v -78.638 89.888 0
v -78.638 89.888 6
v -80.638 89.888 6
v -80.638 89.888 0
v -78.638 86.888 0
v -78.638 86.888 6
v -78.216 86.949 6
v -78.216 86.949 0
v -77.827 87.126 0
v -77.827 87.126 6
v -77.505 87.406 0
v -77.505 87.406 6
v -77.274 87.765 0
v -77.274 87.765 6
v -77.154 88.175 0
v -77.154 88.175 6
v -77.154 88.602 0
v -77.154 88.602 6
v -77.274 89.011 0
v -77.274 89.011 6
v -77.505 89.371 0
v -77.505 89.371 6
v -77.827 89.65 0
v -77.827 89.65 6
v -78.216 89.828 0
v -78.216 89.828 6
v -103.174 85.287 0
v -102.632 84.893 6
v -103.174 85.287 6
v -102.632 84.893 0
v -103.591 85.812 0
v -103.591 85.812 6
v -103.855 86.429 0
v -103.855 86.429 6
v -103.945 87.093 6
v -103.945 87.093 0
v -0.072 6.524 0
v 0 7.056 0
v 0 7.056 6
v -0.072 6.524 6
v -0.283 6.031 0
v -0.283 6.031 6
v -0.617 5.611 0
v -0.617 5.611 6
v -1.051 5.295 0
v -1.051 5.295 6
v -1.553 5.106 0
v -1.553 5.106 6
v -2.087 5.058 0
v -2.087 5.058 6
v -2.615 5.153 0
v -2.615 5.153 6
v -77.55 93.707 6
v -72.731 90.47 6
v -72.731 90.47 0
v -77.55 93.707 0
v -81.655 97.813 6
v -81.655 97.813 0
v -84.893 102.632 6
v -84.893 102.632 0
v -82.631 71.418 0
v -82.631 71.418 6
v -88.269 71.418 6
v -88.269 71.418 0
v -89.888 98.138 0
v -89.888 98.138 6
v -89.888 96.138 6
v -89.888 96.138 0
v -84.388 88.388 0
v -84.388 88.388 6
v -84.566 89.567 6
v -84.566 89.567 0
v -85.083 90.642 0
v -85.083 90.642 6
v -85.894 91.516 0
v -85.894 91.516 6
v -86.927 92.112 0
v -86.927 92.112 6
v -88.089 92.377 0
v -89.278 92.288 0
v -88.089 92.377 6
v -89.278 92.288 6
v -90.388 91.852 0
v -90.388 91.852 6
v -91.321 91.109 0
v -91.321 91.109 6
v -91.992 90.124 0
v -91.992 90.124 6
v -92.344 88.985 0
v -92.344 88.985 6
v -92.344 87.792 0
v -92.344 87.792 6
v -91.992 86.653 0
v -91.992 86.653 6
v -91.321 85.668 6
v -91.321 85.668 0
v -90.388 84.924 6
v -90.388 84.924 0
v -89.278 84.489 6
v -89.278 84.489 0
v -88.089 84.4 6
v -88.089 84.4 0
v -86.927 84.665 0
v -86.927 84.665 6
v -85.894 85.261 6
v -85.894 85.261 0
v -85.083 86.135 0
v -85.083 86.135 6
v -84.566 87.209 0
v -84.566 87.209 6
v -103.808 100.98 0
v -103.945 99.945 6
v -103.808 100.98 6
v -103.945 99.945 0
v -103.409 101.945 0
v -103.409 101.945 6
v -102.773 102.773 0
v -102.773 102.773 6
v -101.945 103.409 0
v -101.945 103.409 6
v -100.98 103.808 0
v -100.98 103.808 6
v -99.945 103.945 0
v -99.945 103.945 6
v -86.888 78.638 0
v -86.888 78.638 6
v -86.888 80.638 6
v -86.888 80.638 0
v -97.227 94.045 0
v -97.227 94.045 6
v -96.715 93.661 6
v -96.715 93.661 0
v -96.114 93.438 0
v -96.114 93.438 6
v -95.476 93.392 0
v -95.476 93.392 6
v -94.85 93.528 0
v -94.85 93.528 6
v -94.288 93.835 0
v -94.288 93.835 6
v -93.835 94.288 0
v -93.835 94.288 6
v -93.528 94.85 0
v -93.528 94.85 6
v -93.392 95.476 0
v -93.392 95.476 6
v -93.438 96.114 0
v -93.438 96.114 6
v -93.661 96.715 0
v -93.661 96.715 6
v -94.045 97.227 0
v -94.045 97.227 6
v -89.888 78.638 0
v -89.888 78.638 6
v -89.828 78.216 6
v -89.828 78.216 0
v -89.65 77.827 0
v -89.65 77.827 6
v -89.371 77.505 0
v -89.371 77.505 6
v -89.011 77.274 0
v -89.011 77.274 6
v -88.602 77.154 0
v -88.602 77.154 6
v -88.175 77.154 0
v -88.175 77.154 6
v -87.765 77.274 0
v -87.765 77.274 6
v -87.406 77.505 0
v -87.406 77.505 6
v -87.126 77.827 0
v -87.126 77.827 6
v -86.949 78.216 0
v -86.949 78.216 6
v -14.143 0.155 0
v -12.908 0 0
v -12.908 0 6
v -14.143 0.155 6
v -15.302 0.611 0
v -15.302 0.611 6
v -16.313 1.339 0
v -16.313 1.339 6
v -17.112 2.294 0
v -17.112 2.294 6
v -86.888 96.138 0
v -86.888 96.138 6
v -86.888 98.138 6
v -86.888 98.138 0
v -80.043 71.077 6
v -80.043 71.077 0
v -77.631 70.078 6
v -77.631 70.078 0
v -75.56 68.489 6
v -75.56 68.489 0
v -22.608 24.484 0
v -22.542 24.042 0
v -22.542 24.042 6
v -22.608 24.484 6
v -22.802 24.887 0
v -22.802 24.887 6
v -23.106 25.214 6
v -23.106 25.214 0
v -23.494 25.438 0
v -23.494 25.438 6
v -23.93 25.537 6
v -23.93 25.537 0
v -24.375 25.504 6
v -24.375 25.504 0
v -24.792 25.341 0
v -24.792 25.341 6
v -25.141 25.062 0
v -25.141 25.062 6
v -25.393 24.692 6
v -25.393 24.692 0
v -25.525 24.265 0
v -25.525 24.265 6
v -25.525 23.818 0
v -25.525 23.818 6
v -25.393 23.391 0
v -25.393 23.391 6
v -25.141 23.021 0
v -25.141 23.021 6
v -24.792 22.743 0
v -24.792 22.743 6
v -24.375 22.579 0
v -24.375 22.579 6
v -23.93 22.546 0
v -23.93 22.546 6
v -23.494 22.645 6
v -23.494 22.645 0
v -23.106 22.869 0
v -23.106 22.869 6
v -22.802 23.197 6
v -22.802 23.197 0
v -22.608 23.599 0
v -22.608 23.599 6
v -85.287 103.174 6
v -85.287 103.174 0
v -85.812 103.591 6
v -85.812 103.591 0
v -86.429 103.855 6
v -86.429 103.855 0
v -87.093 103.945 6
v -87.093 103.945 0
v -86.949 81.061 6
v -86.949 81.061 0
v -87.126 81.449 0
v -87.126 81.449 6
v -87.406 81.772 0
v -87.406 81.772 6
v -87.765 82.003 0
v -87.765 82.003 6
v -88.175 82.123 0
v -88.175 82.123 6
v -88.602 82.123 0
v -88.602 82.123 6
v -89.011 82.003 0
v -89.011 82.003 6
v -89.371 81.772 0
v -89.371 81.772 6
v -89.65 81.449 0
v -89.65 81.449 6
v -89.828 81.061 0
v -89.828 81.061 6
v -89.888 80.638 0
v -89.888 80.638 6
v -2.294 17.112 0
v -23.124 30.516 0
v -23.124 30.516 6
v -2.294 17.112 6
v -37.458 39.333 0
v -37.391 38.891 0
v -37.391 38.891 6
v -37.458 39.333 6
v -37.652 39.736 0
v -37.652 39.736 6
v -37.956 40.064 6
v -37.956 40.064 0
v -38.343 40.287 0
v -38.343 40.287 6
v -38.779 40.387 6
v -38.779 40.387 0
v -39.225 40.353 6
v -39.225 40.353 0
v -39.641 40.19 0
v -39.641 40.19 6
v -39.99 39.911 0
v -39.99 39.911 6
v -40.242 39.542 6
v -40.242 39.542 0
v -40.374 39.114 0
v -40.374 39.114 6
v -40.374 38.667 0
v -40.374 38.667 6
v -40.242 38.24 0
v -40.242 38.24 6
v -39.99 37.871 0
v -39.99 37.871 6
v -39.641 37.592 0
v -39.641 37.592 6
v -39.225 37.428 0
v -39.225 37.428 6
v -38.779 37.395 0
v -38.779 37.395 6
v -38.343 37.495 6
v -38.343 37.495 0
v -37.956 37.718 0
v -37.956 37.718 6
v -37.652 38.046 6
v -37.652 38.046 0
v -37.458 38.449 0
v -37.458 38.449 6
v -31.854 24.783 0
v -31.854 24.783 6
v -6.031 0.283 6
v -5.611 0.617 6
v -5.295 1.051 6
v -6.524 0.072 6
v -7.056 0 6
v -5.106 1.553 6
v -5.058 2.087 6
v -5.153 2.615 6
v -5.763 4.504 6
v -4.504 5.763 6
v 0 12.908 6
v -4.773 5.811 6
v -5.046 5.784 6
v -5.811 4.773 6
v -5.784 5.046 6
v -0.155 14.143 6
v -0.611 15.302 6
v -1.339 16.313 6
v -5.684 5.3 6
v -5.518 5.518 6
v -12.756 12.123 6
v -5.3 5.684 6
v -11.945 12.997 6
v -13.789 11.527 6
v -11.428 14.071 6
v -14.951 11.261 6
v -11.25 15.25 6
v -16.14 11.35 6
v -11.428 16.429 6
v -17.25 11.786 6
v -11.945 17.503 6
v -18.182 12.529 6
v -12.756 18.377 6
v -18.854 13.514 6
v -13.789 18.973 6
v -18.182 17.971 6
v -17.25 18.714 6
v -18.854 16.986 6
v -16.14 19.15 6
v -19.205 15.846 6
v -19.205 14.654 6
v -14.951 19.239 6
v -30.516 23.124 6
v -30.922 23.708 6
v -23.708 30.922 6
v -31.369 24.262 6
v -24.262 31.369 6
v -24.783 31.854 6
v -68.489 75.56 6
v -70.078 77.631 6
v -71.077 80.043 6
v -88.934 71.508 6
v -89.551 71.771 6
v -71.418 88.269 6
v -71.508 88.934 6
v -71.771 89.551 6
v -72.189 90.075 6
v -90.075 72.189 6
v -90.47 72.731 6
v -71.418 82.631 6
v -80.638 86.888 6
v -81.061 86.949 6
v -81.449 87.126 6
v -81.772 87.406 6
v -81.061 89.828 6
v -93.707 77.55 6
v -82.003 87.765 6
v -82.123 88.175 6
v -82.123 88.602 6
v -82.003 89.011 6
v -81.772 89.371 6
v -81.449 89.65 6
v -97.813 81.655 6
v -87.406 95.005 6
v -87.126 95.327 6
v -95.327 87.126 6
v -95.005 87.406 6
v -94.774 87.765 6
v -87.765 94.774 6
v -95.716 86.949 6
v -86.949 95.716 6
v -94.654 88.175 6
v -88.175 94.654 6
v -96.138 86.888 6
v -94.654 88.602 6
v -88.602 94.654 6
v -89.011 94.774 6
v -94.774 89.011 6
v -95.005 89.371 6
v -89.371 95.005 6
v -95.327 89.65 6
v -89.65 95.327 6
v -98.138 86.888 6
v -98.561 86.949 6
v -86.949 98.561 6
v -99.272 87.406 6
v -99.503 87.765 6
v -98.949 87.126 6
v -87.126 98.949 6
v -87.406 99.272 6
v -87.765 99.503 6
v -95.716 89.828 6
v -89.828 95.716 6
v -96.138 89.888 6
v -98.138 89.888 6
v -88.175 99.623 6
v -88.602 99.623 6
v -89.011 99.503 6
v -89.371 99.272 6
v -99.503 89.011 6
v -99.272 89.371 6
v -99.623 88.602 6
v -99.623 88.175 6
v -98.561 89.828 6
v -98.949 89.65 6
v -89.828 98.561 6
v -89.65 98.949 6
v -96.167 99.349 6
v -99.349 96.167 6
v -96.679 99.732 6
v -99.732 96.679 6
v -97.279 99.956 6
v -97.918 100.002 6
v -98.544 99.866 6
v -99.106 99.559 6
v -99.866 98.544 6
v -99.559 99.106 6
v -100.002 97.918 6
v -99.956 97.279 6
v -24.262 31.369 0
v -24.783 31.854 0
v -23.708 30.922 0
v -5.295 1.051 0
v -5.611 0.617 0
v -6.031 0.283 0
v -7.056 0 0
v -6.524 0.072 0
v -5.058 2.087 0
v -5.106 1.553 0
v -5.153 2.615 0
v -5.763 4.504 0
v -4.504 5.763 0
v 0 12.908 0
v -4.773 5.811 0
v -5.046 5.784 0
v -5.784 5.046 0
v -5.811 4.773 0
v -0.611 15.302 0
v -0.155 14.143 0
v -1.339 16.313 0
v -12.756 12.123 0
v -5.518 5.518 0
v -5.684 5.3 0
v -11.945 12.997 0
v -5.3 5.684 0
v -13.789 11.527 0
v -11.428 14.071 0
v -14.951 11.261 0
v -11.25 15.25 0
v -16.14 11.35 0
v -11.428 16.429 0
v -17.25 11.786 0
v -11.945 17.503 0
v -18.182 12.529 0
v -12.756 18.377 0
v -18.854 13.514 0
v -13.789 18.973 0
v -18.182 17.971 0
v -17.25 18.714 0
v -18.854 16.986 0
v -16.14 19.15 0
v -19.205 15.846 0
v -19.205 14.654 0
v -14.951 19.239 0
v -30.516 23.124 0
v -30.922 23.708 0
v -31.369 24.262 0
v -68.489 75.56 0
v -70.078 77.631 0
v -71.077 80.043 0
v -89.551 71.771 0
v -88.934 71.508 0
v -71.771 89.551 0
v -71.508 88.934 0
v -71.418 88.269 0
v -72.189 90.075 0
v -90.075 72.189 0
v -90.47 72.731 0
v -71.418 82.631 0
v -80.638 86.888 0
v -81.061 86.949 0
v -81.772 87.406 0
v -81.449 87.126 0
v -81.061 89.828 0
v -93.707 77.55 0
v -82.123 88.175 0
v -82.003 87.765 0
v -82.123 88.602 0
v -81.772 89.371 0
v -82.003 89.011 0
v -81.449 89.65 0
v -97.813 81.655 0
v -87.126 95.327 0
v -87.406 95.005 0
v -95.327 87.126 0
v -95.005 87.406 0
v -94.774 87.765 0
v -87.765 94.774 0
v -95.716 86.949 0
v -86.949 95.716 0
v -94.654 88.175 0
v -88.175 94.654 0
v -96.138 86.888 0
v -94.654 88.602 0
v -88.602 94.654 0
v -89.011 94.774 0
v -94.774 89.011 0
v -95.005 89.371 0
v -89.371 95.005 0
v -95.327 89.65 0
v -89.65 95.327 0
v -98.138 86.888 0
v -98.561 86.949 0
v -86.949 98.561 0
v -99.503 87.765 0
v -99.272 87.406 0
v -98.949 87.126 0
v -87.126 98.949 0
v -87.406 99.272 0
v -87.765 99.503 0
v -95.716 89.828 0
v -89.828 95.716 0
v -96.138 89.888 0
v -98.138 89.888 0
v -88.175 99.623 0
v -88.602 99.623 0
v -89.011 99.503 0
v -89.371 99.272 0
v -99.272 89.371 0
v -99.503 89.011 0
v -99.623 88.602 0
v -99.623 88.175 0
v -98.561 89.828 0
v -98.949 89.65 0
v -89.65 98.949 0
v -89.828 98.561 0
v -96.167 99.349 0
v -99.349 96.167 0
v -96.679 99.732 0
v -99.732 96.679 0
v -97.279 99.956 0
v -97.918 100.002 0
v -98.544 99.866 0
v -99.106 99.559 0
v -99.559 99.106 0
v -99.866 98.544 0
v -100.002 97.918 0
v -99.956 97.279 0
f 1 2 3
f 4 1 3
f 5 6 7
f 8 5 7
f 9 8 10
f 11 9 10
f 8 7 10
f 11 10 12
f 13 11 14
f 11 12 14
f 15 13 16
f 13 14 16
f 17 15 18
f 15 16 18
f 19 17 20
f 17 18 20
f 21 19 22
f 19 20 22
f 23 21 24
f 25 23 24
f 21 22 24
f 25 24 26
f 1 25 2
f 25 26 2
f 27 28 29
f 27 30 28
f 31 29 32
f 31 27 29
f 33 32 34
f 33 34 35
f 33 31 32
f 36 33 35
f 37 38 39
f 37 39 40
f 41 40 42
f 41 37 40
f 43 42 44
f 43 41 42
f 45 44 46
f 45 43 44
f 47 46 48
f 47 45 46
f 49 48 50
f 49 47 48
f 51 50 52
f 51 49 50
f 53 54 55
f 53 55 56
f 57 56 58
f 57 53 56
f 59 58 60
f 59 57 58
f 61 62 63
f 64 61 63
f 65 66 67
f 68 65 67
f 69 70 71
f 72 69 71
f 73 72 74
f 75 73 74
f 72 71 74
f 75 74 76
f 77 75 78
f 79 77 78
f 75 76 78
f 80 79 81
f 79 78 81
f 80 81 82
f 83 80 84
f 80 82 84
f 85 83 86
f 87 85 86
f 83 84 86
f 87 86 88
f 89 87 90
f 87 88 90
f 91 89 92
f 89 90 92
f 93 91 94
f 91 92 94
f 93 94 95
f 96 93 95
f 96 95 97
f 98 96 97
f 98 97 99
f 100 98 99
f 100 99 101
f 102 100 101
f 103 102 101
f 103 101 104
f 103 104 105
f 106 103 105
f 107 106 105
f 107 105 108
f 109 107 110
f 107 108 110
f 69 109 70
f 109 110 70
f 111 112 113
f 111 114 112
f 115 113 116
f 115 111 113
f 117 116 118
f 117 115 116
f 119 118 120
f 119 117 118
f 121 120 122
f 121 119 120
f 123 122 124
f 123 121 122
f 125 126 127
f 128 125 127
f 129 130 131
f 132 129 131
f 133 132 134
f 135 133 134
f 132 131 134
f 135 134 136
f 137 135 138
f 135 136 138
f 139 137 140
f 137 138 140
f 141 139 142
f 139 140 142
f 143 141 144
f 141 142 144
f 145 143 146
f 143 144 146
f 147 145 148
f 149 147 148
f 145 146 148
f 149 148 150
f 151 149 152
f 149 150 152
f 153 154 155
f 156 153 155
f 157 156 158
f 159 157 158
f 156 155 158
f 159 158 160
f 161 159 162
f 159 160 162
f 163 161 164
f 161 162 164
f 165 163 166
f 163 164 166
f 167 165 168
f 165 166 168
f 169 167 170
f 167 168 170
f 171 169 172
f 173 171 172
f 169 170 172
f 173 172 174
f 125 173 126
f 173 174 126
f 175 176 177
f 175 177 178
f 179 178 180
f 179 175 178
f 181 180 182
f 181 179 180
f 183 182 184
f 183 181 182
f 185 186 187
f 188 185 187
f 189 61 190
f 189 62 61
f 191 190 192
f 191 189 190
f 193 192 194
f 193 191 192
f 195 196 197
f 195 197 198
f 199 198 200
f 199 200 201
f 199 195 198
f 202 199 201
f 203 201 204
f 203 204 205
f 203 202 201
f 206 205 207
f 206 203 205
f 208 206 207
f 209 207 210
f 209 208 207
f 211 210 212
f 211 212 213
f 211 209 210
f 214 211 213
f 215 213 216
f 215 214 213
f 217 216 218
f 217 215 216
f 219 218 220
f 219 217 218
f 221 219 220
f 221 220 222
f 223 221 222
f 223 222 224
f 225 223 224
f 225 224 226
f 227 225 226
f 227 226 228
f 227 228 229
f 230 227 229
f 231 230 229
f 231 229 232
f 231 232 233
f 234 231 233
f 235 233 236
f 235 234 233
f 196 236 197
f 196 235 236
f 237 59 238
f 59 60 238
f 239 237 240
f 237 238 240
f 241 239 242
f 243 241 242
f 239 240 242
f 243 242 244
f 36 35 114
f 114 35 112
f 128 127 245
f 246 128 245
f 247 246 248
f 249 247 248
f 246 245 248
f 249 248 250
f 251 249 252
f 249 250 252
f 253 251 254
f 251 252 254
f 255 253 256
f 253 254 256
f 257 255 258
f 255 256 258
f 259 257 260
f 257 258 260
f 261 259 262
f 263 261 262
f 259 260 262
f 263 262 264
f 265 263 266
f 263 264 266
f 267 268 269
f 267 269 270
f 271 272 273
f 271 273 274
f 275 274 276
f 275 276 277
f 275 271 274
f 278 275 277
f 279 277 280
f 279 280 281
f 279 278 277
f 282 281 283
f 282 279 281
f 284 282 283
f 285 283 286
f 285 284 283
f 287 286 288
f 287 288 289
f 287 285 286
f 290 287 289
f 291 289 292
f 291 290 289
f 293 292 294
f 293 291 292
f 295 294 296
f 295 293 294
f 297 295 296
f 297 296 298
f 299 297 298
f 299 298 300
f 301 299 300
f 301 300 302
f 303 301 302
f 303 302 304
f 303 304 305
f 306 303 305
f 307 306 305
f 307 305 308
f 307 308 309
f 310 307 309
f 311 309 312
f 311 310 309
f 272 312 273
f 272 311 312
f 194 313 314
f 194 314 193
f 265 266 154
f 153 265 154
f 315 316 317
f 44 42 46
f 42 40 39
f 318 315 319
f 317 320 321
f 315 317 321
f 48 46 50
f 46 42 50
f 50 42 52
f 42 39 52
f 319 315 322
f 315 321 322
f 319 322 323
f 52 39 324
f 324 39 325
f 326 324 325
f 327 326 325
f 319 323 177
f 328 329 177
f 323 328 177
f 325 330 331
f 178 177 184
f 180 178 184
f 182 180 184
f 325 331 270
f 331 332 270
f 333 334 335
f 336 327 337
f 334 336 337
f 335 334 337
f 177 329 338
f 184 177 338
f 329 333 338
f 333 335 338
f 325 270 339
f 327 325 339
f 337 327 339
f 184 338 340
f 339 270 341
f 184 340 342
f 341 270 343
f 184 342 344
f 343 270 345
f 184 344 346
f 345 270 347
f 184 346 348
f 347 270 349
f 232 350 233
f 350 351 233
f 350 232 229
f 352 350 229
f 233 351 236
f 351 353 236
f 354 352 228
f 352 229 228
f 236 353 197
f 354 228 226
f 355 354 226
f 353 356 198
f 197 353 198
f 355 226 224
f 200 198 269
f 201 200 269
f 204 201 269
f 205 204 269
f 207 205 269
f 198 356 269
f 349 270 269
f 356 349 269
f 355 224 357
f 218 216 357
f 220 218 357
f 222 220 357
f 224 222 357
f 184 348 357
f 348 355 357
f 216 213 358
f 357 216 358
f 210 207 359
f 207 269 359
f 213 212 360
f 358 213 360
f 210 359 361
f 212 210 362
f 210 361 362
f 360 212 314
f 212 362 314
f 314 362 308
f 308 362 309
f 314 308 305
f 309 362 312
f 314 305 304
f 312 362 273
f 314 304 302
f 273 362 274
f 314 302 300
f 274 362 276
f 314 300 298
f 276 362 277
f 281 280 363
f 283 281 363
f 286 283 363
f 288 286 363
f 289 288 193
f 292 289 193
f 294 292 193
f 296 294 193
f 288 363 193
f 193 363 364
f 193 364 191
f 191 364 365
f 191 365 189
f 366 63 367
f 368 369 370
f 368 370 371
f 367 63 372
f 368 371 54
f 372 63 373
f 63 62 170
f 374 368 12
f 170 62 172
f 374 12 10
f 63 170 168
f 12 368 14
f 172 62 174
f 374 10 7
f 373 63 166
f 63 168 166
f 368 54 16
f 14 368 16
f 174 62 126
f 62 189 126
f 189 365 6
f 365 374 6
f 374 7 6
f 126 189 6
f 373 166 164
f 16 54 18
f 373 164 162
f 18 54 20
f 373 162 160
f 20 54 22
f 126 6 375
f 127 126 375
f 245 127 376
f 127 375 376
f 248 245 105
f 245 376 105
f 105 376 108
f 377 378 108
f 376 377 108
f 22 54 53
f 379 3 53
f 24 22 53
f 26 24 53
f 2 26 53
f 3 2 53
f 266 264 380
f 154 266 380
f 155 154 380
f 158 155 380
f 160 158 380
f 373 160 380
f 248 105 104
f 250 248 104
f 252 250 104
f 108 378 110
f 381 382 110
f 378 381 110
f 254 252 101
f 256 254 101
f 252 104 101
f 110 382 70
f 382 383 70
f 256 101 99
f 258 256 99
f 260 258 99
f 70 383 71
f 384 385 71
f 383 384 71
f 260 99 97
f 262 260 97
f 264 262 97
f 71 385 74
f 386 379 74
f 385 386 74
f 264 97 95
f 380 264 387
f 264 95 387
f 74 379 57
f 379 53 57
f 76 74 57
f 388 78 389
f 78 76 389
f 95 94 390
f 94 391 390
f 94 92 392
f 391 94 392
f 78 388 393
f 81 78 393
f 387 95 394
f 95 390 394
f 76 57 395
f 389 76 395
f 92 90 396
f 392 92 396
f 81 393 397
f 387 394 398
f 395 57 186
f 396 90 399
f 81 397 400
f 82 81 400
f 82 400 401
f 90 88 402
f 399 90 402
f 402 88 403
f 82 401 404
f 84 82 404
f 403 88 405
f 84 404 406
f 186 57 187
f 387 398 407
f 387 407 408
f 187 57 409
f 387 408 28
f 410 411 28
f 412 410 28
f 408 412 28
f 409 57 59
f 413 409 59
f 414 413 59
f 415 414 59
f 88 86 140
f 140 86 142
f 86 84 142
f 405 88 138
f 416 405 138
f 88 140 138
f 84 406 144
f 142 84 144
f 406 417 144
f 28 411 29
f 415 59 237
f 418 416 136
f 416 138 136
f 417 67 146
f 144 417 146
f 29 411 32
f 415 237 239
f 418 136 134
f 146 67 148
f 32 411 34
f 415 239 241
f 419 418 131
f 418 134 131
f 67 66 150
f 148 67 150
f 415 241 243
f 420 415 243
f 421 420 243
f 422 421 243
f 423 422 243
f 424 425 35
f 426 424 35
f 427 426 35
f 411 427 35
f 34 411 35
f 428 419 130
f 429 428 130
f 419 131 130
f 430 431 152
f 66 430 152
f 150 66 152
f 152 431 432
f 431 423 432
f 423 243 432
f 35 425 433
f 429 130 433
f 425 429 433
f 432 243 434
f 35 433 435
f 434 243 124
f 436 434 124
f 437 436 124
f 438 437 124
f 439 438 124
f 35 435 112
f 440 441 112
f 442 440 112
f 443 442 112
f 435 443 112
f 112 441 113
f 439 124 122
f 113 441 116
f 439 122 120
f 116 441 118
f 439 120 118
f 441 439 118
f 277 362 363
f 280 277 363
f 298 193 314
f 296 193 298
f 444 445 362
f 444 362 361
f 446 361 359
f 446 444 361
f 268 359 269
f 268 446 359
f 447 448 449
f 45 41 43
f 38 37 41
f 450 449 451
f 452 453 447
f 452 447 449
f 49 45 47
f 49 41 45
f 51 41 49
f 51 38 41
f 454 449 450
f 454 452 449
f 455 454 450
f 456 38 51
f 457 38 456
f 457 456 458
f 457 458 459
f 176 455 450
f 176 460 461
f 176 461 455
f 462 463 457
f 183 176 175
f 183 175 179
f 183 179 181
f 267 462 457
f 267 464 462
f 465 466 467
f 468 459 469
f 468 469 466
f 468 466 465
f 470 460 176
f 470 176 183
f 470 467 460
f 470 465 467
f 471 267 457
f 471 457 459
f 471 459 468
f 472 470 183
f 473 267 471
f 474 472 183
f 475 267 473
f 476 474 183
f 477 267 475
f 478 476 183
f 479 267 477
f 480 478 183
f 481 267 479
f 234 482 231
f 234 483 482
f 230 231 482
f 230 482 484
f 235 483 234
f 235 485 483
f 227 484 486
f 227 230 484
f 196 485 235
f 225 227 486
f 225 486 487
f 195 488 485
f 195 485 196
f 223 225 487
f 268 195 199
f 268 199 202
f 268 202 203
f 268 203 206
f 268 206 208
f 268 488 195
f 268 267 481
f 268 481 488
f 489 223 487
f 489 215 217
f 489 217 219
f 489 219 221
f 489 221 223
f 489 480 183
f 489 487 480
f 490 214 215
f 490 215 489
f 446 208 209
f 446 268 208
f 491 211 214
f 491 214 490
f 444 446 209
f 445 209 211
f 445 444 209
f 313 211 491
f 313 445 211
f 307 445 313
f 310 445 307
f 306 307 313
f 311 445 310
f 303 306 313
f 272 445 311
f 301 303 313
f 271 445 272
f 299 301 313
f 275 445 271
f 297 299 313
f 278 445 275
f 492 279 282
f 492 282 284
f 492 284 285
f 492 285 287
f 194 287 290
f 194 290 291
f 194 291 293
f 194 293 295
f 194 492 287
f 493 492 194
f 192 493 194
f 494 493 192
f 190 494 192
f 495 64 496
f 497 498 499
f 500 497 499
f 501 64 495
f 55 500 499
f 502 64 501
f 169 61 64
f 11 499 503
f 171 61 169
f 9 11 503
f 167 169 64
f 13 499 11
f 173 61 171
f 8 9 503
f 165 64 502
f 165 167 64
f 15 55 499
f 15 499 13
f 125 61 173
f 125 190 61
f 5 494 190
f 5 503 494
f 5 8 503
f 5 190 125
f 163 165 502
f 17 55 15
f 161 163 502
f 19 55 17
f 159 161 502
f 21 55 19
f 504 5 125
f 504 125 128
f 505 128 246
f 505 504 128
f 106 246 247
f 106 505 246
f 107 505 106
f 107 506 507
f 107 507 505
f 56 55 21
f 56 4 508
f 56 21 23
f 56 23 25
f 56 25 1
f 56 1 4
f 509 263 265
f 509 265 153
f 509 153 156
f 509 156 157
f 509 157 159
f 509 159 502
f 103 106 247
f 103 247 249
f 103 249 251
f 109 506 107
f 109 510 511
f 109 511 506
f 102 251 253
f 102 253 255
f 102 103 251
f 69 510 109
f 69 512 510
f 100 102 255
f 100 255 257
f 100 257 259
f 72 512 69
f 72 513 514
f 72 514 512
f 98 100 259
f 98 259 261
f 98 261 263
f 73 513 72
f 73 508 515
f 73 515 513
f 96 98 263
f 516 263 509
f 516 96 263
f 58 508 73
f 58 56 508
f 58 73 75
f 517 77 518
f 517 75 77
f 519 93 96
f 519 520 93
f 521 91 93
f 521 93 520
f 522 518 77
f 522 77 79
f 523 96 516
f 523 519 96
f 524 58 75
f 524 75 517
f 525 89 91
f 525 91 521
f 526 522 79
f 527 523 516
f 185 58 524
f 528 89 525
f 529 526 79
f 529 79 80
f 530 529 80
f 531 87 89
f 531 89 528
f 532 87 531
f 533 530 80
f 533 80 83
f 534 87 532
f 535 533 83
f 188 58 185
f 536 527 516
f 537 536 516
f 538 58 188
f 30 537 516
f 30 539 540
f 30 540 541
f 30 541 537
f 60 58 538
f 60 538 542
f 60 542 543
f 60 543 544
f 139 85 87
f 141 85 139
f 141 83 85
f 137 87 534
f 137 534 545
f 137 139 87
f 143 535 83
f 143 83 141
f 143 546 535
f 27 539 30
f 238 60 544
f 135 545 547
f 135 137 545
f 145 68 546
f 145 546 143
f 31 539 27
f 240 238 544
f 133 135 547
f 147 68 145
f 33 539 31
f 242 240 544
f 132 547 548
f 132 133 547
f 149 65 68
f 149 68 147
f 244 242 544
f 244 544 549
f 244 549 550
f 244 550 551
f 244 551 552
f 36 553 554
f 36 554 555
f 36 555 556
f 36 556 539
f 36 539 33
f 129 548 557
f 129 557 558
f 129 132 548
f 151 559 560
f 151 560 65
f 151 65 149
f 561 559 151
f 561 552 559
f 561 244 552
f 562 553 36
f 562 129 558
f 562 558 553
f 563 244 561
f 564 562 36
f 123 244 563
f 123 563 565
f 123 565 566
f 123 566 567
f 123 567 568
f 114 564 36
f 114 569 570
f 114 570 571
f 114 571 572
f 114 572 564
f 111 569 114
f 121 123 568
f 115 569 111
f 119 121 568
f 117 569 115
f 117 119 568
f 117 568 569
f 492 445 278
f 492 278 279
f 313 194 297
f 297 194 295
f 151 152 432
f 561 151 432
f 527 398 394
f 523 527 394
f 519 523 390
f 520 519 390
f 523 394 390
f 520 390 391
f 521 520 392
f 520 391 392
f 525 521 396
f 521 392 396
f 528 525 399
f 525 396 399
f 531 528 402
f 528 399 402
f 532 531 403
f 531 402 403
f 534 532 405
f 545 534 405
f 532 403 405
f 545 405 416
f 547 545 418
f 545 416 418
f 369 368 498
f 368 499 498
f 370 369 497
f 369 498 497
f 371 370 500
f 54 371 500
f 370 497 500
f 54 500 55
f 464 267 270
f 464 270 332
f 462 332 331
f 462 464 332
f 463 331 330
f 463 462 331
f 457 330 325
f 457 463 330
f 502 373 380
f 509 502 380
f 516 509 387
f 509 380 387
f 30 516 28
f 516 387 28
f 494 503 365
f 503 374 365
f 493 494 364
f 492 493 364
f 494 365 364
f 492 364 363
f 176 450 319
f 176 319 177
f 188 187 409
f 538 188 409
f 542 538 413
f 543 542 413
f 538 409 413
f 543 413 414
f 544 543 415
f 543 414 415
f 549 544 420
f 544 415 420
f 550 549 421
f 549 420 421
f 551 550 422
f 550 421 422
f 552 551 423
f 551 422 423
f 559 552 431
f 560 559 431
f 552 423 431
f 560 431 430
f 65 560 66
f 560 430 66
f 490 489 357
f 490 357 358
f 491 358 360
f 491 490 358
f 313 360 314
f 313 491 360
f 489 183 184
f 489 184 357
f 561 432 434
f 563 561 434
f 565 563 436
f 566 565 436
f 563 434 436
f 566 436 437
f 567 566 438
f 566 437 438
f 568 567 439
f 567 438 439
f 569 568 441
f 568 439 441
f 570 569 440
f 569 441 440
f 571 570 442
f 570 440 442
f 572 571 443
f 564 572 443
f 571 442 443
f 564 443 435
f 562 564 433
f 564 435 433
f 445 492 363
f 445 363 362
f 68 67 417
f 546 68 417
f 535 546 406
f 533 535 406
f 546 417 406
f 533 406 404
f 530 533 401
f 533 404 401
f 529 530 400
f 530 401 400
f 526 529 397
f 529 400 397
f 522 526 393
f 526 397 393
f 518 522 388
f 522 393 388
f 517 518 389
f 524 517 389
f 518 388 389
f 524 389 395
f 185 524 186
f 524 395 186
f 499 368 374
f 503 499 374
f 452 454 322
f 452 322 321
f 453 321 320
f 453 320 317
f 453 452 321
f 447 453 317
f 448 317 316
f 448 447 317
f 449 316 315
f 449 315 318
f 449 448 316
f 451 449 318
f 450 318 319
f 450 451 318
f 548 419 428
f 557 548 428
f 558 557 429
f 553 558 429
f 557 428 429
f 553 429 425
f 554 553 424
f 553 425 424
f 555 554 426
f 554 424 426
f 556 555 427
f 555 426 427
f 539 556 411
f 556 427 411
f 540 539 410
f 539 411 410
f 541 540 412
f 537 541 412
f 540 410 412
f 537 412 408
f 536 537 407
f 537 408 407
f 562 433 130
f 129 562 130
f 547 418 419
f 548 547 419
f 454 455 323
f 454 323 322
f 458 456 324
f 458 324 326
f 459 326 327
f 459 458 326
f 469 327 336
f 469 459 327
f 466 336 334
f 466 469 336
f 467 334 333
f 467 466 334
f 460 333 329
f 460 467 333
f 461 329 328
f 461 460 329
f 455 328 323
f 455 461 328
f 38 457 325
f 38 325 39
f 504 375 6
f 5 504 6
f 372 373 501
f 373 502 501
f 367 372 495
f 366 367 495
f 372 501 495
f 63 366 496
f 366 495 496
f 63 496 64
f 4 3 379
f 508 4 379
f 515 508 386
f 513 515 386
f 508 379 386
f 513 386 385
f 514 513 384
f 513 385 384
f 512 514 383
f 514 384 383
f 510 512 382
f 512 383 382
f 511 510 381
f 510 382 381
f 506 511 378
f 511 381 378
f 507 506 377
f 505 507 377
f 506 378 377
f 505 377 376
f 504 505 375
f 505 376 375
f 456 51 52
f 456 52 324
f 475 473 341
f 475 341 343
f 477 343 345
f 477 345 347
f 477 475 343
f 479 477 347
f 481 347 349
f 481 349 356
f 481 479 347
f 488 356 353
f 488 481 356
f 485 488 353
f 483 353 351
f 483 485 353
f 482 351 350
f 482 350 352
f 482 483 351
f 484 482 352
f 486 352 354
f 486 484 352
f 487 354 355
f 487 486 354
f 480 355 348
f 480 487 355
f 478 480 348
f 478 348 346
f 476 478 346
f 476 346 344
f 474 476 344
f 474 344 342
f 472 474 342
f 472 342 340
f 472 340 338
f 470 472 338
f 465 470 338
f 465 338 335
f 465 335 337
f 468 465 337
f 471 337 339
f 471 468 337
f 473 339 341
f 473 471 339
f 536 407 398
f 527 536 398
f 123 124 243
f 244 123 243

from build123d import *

# Parameters (mm, degrees)
CROQUIS1_R              = 1.5
CROQUIS1_R_2            = 4
SALIENTE_EXTRUIR1_DEPTH = 6
CROQUIS4_R              = 4
SALIENTE_EXTRUIR3_DEPTH = 6
CORTAR_EXTRUIR1_DEPTH   = 6
REDONDEO3_R             = 4
CORTAR_EXTRUIR2_DEPTH   = 6
REDONDEO4_R             = 2.5
REDONDEO6_R             = 10


with BuildPart() as part:
    # Croquis1 → Saliente-Extruir1 (new body)
    with BuildSketch(Plane.XY):
        with BuildLine():
            Line((-17.112213819, 2.294275414), (-30.516043414, 23.123582692))
            ThreePointArc((-30.516043414, 23.123582692), (-31.14080226, 23.989156666), (-31.854269143, 24.783201331))
            Line((-31.854269143, 24.783201331), (-45.961940777, 38.890872965))
            Line((-45.961940777, 38.890872965), (-78.488852712, 71.4177849))
            Line((-78.488852712, 71.4177849), (-71.4177849, 78.488852712))
            Line((-71.4177849, 78.488852712), (-38.890872965, 45.961940777))
            Line((-38.890872965, 45.961940777), (-24.783201331, 31.854269143))
            ThreePointArc((-24.783201331, 31.854269143), (-23.989156666, 31.14080226), (-23.123582692, 30.516043414))
            Line((-23.123582692, 30.516043414), (-2.294275414, 17.112213819))
            ThreePointArc((-2.294275414, 17.112213819), (-0.610887166, 15.302496804), (0, 12.907567049))
            Line((0, 12.907567049), (0, 7.055686841))
            ThreePointArc((0, 7.055686841), (-0.823113423, 5.438609853), (-2.614937985, 5.15257064))
            Line((-2.614937985, 5.15257064), (-4.503911831, 5.762938925))
            ThreePointArc((-4.503911831, 5.762938925), (-5.518487605, 5.518487605), (-5.762938925, 4.503911831))
            Line((-5.762938925, 4.503911831), (-5.15257064, 2.614937985))
            ThreePointArc((-5.15257064, 2.614937985), (-5.438609853, 0.823113423), (-7.055686841, 0))
            Line((-7.055686841, 0), (-12.907567049, 0))
            ThreePointArc((-12.907567049, 0), (-15.302496804, 0.610887166), (-17.112213819, 2.294275414))
        make_face()
        with Locations((-38.890872965, 38.890872965)):
            Circle(CROQUIS1_R, mode=Mode.SUBTRACT)
        with Locations((-24.04163056, 24.04163056)):
            Circle(CROQUIS1_R, mode=Mode.SUBTRACT)
        with Locations((-15.25, 15.25)):
            Circle(CROQUIS1_R_2, mode=Mode.SUBTRACT)
    extrude(amount=SALIENTE_EXTRUIR1_DEPTH)

    # Croquis4 → Saliente-Extruir3 (add)
    with BuildSketch(Plane.XY.offset(6)):
        Polygon((-78.488852712, 71.4177849), (-89.802561211, 71.4177849), (-103.944696834, 85.559920524), (-103.944696834, 103.944696834), (-85.559920524, 103.944696834), (-71.4177849, 89.802561211), (-71.4177849, 78.488852712), align=None)
        with Locations((-88.388347648, 88.388347648)):
            Circle(CROQUIS4_R, mode=Mode.SUBTRACT)
    extrude(amount=-SALIENTE_EXTRUIR3_DEPTH)

    # Croquis5 → Cortar-Extruir1 (cut)
    with BuildSketch(Plane.XY.offset(6)):
        with BuildLine():
            Line((-99.348502757, 96.166522241), (-97.227182413, 94.045201898))
            ThreePointArc((-97.227182413, 94.045201898), (-94.045201898, 94.045201898), (-94.045201898, 97.227182413))
            Line((-94.045201898, 97.227182413), (-96.166522241, 99.348502757))
            ThreePointArc((-96.166522241, 99.348502757), (-99.348502757, 99.348502757), (-99.348502757, 96.166522241))
        make_face()
        with BuildLine():
            Line((-89.888347648, 80.638347648), (-89.888347648, 78.638347648))
            ThreePointArc((-89.888347648, 78.638347648), (-88.388347648, 77.138347648), (-86.888347648, 78.638347648))
            Line((-86.888347648, 78.638347648), (-86.888347648, 80.638347648))
            ThreePointArc((-86.888347648, 80.638347648), (-88.388347648, 82.138347648), (-89.888347648, 80.638347648))
        make_face()
        with BuildLine():
            Line((-80.638347648, 86.888347648), (-78.638347648, 86.888347648))
            ThreePointArc((-78.638347648, 86.888347648), (-77.138347648, 88.388347648), (-78.638347648, 89.888347648))
            Line((-78.638347648, 89.888347648), (-80.638347648, 89.888347648))
            ThreePointArc((-80.638347648, 89.888347648), (-82.138347648, 88.388347648), (-80.638347648, 86.888347648))
        make_face()
        with BuildLine():
            Line((-96.138347648, 89.888347648), (-98.138347648, 89.888347648))
            ThreePointArc((-98.138347648, 89.888347648), (-99.638347648, 88.388347648), (-98.138347648, 86.888347648))
            Line((-98.138347648, 86.888347648), (-96.138347648, 86.888347648))
            ThreePointArc((-96.138347648, 86.888347648), (-94.638347648, 88.388347648), (-96.138347648, 89.888347648))
        make_face()
        with BuildLine():
            Line((-86.888347648, 96.138347648), (-86.888347648, 98.138347648))
            ThreePointArc((-86.888347648, 98.138347648), (-88.388347648, 99.638347648), (-89.888347648, 98.138347648))
            Line((-89.888347648, 98.138347648), (-89.888347648, 96.138347648))
            ThreePointArc((-89.888347648, 96.138347648), (-88.388347648, 94.638347648), (-86.888347648, 96.138347648))
        make_face()
    extrude(amount=-CORTAR_EXTRUIR1_DEPTH, mode=Mode.SUBTRACT)

    # Redondeo3
    redondeo3_edges = [part.edges().sort_by_distance(p)[0] for p in [
        (-103.944696834, 103.944696834, 3),
    ]]
    fillet(redondeo3_edges, radius=REDONDEO3_R)

    # Croquis7 → Cortar-Extruir2 (cut)
    with BuildSketch(Plane.XY.offset(6)):
        with BuildLine():
            Line((-103.944696834, 85.559920524), (-89.802561211, 71.4177849))
            ThreePointArc((-89.802561211, 71.4177849), (-95.660425587, 79.702056147), (-103.944696834, 85.559920524))
        make_face()
        with BuildLine():
            Line((-85.559920524, 103.944696834), (-71.4177849, 89.802561211))
            ThreePointArc((-71.4177849, 89.802561211), (-79.702056147, 95.660425587), (-85.559920524, 103.944696834))
        make_face()
    extrude(amount=-CORTAR_EXTRUIR2_DEPTH, mode=Mode.SUBTRACT)

    # Redondeo4
    redondeo4_edges = [part.edges().sort_by_distance(p)[0] for p in [
        (-89.802561211, 71.4177849, 3),
        (-103.944696834, 85.559920524, 3),
        (-85.559920524, 103.944696834, 3),
        (-71.4177849, 89.802561211, 3),
    ]]
    fillet(redondeo4_edges, radius=REDONDEO4_R)

    # Redondeo6
    redondeo6_edges = [part.edges().sort_by_distance(p)[0] for p in [
        (-78.488852712, 71.4177849, 3),
        (-71.4177849, 78.488852712, 3),
    ]]
    fillet(redondeo6_edges, radius=REDONDEO6_R)


solid = part.part
